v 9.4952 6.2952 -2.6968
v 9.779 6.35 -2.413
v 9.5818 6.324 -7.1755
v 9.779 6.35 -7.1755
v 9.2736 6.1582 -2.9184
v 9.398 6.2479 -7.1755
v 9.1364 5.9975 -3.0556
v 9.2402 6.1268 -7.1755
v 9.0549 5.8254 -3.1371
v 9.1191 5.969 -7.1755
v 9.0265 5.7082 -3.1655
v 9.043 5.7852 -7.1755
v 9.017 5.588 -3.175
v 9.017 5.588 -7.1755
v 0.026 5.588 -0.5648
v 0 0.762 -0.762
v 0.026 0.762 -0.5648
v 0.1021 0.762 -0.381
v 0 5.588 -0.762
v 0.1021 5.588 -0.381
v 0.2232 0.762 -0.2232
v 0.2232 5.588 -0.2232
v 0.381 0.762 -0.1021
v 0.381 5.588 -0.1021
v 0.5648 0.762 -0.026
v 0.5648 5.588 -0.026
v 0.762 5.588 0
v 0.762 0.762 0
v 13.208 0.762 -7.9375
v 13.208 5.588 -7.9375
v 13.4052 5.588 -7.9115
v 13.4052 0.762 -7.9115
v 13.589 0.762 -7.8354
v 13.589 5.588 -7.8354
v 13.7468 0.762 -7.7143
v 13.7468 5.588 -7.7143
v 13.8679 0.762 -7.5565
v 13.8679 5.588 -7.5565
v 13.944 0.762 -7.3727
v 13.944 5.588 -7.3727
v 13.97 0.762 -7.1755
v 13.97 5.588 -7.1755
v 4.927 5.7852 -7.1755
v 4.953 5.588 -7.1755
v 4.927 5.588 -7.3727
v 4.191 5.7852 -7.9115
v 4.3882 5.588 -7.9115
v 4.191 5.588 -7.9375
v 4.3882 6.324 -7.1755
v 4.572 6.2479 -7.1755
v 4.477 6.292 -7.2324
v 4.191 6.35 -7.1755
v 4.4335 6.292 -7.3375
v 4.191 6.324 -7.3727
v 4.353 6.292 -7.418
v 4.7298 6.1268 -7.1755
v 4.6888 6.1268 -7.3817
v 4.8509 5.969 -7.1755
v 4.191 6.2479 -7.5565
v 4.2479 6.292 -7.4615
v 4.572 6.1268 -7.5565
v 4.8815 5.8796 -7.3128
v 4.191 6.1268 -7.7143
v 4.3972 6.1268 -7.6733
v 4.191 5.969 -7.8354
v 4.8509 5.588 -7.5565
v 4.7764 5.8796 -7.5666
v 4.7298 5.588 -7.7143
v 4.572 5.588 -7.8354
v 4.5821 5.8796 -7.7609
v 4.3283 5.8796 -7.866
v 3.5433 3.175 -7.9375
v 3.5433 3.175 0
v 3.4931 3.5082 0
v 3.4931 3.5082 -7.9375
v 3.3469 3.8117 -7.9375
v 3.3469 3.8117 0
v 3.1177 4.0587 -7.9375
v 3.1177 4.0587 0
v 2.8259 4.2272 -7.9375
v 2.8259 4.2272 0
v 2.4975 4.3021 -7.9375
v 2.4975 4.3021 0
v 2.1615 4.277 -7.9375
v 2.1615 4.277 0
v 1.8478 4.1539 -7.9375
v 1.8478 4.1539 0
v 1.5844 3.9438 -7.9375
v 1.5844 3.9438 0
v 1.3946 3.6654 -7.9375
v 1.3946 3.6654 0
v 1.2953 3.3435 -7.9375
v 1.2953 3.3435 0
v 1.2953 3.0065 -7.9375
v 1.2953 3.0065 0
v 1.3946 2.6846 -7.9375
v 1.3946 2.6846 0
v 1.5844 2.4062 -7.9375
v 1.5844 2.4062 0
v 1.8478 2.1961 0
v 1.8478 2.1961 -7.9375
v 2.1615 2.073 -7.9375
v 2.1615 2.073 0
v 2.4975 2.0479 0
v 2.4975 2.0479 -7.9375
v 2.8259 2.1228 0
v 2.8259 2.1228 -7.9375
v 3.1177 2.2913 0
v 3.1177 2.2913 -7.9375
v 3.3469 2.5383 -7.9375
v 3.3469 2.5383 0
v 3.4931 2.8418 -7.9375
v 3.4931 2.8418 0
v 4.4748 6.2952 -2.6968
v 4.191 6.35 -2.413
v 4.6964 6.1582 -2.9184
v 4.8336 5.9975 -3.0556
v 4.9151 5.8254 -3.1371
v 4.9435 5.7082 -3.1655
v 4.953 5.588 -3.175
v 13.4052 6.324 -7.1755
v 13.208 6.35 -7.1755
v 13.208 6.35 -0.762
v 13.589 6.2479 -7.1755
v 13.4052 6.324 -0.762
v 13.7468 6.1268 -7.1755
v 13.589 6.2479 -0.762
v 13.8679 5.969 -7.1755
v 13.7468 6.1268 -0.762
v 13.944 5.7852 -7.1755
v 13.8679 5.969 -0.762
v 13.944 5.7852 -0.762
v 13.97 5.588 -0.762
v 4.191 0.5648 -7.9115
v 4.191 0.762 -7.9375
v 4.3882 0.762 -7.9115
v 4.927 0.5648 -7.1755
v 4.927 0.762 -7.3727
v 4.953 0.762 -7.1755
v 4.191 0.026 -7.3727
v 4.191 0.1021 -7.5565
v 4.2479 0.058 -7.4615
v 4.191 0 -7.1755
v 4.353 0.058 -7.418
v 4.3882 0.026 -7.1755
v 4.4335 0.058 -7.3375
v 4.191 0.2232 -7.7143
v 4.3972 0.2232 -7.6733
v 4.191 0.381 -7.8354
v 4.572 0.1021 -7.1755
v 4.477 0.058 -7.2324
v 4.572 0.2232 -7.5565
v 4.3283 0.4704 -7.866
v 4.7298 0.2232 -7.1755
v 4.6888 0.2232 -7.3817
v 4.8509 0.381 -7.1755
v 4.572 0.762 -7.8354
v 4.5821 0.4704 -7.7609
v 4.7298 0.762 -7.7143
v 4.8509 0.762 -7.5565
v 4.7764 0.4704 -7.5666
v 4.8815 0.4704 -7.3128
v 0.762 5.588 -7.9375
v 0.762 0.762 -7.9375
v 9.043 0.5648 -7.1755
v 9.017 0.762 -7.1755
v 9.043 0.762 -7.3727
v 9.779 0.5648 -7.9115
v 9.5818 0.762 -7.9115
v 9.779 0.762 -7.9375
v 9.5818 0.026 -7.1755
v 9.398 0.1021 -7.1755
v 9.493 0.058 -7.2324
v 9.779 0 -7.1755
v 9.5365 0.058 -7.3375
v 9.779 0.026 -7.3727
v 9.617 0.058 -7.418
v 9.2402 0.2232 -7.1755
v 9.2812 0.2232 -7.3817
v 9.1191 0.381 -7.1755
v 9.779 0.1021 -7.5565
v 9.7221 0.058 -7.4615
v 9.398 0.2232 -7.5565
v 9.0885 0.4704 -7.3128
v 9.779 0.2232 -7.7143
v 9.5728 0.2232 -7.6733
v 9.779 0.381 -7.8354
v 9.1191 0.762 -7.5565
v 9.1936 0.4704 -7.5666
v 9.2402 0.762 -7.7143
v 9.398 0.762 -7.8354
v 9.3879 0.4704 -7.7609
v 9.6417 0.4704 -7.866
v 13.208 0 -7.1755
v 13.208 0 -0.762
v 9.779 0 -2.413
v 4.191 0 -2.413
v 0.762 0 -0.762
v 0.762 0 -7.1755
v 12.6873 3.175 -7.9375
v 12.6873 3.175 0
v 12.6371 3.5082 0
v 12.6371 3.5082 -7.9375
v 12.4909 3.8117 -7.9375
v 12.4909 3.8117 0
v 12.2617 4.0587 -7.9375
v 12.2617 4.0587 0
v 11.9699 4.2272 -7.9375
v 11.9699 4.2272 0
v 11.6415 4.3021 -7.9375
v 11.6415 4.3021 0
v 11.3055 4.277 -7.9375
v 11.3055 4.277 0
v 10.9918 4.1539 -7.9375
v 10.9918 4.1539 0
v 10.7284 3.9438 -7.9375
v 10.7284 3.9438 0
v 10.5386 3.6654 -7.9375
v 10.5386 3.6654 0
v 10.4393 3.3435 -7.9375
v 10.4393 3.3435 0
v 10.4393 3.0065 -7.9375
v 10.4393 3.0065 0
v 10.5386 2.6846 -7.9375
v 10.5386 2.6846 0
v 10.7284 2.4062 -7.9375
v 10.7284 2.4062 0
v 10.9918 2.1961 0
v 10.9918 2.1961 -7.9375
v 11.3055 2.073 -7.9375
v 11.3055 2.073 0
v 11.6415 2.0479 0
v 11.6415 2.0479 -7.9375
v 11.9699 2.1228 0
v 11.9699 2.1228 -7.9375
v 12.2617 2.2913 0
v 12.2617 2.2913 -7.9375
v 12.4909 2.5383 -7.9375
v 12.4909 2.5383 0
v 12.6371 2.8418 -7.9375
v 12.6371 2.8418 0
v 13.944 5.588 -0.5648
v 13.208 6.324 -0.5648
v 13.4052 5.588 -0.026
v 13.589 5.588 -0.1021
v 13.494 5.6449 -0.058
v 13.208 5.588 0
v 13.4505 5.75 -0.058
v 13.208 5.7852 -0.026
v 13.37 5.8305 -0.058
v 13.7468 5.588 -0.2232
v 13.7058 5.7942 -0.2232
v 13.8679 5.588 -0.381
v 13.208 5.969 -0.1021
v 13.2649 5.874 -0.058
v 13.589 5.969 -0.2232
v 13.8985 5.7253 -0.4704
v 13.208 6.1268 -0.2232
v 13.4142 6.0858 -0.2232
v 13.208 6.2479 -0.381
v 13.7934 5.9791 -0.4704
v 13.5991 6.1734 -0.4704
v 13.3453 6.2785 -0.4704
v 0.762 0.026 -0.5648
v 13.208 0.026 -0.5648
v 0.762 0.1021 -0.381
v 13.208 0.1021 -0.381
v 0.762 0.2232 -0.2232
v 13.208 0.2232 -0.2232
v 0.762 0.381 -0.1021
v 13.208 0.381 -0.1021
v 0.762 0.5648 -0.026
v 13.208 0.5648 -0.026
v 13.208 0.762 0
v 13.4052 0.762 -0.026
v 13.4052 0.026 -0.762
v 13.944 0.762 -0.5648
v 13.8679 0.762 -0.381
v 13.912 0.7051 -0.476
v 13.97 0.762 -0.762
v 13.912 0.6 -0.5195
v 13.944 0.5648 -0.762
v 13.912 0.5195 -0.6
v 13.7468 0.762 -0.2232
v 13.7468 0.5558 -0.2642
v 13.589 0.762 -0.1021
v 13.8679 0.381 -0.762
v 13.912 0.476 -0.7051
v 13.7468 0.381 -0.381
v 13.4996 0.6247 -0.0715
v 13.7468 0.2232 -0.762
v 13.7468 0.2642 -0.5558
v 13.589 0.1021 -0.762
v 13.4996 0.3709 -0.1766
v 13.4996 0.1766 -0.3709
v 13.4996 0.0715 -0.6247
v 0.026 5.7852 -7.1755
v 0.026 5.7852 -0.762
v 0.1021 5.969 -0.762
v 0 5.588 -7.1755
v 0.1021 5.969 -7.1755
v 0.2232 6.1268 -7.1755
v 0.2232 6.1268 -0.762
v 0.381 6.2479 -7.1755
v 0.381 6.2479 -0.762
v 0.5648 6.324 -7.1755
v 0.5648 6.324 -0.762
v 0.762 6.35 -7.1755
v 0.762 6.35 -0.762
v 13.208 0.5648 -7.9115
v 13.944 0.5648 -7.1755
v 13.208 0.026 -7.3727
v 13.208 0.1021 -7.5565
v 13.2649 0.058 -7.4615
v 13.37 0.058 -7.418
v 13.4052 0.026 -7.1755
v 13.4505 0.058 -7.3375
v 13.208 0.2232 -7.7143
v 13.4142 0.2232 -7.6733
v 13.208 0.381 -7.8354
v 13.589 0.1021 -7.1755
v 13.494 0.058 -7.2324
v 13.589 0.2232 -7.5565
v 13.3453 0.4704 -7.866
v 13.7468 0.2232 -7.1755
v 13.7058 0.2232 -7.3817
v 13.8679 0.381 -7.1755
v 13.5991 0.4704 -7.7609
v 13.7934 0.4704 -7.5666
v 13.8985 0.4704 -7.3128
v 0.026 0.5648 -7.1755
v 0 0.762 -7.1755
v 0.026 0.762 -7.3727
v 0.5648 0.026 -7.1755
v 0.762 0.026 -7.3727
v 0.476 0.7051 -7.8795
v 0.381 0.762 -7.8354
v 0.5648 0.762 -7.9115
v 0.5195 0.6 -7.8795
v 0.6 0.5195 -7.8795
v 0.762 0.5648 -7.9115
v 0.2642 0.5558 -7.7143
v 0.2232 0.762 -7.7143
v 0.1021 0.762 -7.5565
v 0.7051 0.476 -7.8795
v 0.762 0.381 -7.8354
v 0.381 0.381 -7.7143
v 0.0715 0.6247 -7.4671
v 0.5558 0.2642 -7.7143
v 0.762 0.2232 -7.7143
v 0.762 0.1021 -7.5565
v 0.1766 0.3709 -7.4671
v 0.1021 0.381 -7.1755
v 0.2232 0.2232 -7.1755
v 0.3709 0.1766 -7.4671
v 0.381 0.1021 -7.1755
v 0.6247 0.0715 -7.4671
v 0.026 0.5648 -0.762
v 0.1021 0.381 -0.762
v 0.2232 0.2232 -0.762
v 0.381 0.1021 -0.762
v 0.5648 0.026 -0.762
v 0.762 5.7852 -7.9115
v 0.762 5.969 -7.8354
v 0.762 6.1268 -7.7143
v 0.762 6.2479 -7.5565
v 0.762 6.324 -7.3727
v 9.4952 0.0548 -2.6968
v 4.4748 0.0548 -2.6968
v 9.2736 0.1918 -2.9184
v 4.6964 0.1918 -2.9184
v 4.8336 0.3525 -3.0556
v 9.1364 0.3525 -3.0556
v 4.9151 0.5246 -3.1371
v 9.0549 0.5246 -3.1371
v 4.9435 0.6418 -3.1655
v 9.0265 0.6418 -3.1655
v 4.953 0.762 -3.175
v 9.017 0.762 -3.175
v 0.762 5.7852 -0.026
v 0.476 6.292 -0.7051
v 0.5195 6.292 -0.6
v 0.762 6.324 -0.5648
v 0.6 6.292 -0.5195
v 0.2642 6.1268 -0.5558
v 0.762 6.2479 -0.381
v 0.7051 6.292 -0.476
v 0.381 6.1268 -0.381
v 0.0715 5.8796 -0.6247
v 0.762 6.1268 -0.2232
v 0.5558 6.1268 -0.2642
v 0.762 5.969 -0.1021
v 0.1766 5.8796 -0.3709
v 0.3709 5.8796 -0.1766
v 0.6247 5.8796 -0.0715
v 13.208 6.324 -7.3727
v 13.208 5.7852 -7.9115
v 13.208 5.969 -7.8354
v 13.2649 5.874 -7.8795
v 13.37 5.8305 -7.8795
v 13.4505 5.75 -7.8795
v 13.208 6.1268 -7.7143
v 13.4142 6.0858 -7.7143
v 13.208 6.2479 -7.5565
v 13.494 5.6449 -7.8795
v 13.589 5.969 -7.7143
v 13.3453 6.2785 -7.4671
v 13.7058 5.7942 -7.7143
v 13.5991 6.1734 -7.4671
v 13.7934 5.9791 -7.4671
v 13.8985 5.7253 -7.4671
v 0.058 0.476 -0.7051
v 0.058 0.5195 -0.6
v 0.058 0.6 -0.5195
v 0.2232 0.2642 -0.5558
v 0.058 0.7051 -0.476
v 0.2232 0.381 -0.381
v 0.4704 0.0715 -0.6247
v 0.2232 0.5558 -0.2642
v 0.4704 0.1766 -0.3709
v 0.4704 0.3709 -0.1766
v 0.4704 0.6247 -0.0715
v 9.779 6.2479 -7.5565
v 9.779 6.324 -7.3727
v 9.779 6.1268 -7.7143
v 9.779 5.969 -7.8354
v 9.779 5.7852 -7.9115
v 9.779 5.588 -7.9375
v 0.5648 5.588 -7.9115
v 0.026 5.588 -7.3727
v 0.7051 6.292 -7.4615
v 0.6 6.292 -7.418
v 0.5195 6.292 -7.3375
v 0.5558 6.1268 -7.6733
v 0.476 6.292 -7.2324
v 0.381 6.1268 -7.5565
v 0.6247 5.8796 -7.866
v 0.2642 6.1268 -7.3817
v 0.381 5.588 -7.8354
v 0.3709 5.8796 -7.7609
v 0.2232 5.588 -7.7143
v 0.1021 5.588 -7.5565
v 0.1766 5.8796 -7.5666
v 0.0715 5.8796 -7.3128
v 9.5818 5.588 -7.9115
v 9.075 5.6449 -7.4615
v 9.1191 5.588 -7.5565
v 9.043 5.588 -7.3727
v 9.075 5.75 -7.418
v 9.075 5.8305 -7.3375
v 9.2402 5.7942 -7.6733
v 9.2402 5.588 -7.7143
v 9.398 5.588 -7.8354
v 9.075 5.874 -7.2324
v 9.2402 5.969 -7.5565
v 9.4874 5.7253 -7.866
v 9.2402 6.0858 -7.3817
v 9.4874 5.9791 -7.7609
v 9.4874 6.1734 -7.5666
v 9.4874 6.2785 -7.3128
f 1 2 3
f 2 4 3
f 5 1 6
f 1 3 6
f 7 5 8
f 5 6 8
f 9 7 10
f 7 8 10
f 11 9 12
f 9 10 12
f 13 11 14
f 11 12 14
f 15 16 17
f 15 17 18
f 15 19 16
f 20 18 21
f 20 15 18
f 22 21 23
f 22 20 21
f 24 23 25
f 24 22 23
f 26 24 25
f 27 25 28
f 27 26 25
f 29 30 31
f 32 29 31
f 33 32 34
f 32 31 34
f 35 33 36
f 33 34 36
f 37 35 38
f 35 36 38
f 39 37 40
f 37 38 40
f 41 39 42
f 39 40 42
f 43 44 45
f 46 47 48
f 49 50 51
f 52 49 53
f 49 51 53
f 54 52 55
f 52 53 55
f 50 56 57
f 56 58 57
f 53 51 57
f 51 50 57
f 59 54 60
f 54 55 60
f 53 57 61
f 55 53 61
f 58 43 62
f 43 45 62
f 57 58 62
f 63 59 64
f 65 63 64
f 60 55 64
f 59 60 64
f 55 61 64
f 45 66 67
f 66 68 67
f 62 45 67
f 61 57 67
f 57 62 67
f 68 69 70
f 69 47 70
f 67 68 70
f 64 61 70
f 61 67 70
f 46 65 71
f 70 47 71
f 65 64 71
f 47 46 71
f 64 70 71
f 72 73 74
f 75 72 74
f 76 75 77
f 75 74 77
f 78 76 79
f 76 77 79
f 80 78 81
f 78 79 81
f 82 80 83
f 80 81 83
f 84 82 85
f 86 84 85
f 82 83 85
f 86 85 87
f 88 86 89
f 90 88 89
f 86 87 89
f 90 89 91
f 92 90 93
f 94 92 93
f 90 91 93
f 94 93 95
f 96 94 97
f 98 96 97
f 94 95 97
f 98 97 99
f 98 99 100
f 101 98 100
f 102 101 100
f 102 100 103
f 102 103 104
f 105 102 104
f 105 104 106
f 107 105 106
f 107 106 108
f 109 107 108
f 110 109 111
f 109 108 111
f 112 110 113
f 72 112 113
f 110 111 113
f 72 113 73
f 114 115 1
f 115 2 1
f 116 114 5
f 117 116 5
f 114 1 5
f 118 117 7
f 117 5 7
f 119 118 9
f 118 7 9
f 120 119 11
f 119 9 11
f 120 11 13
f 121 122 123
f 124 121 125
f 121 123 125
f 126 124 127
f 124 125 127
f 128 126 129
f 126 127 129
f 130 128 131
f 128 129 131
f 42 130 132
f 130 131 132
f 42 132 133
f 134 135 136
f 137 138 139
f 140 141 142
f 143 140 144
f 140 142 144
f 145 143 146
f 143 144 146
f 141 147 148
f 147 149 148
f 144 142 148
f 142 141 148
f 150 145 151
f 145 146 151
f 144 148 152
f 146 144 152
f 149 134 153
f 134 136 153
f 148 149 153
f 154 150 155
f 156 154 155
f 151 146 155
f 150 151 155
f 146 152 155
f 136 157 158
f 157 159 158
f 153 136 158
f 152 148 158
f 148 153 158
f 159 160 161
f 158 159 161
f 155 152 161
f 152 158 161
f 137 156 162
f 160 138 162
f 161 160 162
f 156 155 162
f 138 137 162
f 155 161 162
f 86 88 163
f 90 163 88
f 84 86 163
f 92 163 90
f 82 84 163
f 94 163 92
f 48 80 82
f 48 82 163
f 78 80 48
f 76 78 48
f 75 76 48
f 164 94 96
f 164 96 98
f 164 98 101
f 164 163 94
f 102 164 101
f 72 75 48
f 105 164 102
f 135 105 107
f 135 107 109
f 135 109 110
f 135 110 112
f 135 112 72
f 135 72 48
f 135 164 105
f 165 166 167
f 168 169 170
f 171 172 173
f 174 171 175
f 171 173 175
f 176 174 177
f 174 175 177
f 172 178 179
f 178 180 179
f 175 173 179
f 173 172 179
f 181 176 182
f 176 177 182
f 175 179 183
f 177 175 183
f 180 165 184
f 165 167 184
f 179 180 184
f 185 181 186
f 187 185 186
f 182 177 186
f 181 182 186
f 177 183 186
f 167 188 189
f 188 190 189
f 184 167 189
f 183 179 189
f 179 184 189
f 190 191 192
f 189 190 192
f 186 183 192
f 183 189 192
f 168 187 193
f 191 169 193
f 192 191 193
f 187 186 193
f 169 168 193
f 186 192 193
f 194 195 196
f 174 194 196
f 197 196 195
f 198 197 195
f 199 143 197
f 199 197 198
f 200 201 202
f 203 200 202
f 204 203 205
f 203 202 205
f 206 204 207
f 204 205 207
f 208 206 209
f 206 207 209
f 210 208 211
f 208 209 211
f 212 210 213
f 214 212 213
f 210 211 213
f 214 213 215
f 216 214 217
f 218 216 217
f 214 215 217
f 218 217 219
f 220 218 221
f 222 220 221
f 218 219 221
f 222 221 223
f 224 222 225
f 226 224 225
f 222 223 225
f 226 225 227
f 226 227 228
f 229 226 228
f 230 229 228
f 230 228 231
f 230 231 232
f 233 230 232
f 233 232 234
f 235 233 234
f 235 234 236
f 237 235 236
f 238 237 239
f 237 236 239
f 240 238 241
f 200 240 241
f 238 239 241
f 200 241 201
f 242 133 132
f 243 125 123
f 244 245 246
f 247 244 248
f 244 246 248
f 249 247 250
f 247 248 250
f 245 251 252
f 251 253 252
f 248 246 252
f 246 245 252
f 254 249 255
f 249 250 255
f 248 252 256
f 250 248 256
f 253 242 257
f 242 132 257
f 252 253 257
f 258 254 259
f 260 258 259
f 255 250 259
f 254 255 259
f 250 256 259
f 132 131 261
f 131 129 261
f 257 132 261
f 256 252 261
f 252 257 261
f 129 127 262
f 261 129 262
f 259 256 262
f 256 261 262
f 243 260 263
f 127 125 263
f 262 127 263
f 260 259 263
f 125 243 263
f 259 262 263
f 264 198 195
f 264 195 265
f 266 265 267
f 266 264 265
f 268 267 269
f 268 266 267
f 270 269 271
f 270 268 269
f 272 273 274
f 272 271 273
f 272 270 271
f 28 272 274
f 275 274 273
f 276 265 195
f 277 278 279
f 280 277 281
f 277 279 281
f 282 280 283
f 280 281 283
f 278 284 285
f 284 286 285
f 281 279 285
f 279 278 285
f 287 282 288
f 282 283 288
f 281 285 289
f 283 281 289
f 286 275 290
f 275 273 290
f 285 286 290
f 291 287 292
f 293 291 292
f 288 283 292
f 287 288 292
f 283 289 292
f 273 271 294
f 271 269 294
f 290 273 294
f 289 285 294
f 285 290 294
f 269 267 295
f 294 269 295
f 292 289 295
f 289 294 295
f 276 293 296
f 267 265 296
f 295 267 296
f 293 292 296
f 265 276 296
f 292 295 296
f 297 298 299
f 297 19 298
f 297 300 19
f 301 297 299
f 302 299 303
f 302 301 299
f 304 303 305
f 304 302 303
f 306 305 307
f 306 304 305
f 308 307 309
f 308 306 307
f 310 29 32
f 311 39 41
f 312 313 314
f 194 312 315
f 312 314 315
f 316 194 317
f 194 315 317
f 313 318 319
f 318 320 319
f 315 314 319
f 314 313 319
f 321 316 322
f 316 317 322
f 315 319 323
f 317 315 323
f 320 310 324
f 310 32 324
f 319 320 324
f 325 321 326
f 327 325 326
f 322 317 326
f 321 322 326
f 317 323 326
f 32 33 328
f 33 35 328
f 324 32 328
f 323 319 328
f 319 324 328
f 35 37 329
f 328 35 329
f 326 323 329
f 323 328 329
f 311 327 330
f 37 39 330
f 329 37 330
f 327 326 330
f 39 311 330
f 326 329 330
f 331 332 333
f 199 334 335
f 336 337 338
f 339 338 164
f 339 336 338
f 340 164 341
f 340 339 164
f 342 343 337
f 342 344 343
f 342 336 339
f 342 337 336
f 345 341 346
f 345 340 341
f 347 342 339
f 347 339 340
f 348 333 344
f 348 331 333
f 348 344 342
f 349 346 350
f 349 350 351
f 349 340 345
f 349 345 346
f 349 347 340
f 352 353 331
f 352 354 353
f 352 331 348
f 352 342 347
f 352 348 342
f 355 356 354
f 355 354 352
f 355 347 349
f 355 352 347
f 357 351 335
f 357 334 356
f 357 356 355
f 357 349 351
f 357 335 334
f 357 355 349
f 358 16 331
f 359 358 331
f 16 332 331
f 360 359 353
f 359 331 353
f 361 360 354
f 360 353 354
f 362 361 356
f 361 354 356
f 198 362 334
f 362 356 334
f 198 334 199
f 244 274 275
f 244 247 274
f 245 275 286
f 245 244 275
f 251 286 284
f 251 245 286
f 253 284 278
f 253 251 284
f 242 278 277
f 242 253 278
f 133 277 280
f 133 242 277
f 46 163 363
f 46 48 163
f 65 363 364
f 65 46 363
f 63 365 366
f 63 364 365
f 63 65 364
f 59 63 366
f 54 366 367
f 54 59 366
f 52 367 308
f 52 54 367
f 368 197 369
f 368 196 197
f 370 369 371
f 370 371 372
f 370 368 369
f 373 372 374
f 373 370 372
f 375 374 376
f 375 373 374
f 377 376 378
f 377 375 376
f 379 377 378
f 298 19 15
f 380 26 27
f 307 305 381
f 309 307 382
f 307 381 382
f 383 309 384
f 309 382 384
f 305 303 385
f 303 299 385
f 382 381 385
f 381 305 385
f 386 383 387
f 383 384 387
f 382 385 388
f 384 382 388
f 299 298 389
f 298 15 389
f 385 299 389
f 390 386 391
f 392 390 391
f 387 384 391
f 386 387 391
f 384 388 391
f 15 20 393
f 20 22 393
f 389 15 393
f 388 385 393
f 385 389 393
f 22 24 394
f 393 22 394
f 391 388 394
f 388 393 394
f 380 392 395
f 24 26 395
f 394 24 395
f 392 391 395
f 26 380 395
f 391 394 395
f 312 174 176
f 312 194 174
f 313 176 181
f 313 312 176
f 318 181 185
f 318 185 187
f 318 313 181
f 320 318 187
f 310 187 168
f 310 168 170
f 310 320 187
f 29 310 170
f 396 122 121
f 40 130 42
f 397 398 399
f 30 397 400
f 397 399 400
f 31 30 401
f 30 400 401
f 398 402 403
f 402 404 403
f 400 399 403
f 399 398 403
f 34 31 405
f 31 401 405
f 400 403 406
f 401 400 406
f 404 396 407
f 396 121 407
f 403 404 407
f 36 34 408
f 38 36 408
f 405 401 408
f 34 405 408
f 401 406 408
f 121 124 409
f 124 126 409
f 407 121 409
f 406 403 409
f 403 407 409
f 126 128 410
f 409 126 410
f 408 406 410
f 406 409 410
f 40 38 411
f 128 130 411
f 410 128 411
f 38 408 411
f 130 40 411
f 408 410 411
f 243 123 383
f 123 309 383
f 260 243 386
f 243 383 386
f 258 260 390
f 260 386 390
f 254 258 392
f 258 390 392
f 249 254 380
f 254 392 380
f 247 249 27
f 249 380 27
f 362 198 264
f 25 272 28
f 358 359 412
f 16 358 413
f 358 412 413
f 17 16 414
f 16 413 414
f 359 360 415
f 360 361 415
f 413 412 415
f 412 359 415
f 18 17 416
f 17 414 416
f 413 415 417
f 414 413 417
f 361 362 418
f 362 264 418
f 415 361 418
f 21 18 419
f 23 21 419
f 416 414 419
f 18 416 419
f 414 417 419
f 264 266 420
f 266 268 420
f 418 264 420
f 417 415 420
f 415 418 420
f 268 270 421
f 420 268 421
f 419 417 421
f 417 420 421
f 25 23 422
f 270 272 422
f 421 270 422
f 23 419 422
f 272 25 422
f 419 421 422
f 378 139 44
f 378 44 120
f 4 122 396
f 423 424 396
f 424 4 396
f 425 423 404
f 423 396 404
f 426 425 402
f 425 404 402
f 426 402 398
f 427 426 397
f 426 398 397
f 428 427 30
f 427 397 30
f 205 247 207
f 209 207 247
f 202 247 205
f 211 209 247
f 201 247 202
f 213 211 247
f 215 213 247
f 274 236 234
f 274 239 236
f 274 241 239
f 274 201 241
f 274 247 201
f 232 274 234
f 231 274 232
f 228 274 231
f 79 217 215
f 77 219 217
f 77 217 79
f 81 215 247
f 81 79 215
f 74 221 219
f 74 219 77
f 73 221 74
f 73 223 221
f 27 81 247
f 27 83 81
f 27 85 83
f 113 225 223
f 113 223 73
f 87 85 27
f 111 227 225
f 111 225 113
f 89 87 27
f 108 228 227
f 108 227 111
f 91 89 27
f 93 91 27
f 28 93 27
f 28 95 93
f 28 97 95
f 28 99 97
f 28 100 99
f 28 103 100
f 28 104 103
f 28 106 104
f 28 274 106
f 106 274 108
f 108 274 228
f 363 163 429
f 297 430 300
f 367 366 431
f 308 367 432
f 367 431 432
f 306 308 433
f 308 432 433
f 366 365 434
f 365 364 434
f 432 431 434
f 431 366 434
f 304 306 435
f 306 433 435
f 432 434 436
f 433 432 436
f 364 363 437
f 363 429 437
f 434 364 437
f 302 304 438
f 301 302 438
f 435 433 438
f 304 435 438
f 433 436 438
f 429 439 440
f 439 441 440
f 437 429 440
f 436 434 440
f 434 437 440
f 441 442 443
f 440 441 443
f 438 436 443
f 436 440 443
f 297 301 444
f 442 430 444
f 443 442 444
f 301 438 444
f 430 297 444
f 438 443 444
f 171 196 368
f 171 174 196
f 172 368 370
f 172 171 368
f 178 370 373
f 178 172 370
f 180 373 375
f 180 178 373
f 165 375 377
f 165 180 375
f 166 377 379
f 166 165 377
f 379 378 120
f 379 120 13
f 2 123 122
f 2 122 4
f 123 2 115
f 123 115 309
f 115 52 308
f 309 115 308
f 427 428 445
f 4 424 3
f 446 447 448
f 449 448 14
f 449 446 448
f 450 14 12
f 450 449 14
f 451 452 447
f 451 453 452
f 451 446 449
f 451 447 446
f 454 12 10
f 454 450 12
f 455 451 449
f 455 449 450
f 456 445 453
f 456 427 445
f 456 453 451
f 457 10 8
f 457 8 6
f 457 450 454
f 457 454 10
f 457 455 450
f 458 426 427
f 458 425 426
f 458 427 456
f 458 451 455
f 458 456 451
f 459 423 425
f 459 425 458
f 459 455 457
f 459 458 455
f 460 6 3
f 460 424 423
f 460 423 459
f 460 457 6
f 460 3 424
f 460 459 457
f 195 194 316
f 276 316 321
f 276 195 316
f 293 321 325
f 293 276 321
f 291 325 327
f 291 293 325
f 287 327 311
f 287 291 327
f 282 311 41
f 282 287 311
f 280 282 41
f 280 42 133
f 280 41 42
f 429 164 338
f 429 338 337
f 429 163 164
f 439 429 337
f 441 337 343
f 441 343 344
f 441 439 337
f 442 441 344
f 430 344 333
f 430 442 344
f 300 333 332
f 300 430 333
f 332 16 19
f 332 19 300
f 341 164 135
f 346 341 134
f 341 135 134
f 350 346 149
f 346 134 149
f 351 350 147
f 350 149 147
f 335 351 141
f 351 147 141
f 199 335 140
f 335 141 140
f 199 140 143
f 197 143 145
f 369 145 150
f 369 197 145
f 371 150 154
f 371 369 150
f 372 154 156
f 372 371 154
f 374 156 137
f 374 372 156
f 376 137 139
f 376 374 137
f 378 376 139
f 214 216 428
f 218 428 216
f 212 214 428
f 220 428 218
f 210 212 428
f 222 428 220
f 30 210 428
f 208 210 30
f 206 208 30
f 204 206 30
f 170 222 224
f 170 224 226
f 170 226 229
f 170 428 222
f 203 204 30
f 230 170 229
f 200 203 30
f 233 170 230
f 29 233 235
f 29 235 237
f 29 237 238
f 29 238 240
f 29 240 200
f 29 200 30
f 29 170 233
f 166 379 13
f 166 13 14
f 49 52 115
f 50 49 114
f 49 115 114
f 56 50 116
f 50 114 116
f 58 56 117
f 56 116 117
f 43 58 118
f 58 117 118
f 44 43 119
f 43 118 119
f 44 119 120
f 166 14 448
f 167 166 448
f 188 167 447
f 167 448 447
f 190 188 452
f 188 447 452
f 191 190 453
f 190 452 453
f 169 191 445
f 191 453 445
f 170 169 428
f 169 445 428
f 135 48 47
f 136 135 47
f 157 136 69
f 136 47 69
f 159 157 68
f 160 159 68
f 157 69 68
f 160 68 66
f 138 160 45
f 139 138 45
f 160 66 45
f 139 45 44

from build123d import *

# Parameters (mm, degrees)
BOSS_EXTRUDE1_DEPTH = 6.35
SKETCH2_R           = 1.1303
CUT_EXTRUDE1_DEPTH  = 7.9375
FILLET1_R           = 0.762


with BuildPart() as part:
    # Sketch1 → Boss-Extrude1 (new body)
    with BuildSketch(Plane(origin=(0, 0, 0), x_dir=(1, 0, 0), z_dir=(0, 1, 0))):
        Polygon((0, 7.9375), (4.953, 7.9375), (4.953, 3.175), (9.017, 3.175), (9.017, 7.9375), (13.97, 7.9375), (13.97, 0), (0, 0), align=None)
    extrude(amount=BOSS_EXTRUDE1_DEPTH)

    # Sketch2 → Cut-Extrude1 (cut)
    with BuildSketch(Plane.XY):
        with Locations((2.413, 3.175)):
            Circle(SKETCH2_R)
        with Locations((11.557, 3.175)):
            Circle(SKETCH2_R)
    extrude(amount=-CUT_EXTRUDE1_DEPTH, mode=Mode.SUBTRACT)

    # Fillet1
    fillet1_edges = [part.edges().sort_by_distance(p)[0] for p in [
        (13.97, 6.35, -3.96875),
        (6.985, 0, 0),
        (0, 0, -3.96875),
        (11.4935, 6.35, -7.9375),
        (0, 3.175, -7.9375),
        (4.953, 3.175, -7.9375),
        (9.017, 3.175, -7.9375),
        (13.97, 3.175, -7.9375),
        (13.97, 3.175, 0),
        (0, 3.175, 0),
        (9.017, 6.35, -5.55625),
        (6.985, 6.35, -3.175),
        (4.953, 6.35, -5.55625),
        (2.4765, 6.35, -7.9375),
        (0, 6.35, -3.96875),
        (6.985, 6.35, 0),
        (2.4765, 0, -7.9375),
        (4.953, 0, -5.55625),
        (6.985, 0, -3.175),
        (9.017, 0, -5.55625),
        (11.4935, 0, -7.9375),
        (13.97, 0, -3.96875),
    ]]
    fillet(fillet1_edges, radius=FILLET1_R)


solid = part.part
